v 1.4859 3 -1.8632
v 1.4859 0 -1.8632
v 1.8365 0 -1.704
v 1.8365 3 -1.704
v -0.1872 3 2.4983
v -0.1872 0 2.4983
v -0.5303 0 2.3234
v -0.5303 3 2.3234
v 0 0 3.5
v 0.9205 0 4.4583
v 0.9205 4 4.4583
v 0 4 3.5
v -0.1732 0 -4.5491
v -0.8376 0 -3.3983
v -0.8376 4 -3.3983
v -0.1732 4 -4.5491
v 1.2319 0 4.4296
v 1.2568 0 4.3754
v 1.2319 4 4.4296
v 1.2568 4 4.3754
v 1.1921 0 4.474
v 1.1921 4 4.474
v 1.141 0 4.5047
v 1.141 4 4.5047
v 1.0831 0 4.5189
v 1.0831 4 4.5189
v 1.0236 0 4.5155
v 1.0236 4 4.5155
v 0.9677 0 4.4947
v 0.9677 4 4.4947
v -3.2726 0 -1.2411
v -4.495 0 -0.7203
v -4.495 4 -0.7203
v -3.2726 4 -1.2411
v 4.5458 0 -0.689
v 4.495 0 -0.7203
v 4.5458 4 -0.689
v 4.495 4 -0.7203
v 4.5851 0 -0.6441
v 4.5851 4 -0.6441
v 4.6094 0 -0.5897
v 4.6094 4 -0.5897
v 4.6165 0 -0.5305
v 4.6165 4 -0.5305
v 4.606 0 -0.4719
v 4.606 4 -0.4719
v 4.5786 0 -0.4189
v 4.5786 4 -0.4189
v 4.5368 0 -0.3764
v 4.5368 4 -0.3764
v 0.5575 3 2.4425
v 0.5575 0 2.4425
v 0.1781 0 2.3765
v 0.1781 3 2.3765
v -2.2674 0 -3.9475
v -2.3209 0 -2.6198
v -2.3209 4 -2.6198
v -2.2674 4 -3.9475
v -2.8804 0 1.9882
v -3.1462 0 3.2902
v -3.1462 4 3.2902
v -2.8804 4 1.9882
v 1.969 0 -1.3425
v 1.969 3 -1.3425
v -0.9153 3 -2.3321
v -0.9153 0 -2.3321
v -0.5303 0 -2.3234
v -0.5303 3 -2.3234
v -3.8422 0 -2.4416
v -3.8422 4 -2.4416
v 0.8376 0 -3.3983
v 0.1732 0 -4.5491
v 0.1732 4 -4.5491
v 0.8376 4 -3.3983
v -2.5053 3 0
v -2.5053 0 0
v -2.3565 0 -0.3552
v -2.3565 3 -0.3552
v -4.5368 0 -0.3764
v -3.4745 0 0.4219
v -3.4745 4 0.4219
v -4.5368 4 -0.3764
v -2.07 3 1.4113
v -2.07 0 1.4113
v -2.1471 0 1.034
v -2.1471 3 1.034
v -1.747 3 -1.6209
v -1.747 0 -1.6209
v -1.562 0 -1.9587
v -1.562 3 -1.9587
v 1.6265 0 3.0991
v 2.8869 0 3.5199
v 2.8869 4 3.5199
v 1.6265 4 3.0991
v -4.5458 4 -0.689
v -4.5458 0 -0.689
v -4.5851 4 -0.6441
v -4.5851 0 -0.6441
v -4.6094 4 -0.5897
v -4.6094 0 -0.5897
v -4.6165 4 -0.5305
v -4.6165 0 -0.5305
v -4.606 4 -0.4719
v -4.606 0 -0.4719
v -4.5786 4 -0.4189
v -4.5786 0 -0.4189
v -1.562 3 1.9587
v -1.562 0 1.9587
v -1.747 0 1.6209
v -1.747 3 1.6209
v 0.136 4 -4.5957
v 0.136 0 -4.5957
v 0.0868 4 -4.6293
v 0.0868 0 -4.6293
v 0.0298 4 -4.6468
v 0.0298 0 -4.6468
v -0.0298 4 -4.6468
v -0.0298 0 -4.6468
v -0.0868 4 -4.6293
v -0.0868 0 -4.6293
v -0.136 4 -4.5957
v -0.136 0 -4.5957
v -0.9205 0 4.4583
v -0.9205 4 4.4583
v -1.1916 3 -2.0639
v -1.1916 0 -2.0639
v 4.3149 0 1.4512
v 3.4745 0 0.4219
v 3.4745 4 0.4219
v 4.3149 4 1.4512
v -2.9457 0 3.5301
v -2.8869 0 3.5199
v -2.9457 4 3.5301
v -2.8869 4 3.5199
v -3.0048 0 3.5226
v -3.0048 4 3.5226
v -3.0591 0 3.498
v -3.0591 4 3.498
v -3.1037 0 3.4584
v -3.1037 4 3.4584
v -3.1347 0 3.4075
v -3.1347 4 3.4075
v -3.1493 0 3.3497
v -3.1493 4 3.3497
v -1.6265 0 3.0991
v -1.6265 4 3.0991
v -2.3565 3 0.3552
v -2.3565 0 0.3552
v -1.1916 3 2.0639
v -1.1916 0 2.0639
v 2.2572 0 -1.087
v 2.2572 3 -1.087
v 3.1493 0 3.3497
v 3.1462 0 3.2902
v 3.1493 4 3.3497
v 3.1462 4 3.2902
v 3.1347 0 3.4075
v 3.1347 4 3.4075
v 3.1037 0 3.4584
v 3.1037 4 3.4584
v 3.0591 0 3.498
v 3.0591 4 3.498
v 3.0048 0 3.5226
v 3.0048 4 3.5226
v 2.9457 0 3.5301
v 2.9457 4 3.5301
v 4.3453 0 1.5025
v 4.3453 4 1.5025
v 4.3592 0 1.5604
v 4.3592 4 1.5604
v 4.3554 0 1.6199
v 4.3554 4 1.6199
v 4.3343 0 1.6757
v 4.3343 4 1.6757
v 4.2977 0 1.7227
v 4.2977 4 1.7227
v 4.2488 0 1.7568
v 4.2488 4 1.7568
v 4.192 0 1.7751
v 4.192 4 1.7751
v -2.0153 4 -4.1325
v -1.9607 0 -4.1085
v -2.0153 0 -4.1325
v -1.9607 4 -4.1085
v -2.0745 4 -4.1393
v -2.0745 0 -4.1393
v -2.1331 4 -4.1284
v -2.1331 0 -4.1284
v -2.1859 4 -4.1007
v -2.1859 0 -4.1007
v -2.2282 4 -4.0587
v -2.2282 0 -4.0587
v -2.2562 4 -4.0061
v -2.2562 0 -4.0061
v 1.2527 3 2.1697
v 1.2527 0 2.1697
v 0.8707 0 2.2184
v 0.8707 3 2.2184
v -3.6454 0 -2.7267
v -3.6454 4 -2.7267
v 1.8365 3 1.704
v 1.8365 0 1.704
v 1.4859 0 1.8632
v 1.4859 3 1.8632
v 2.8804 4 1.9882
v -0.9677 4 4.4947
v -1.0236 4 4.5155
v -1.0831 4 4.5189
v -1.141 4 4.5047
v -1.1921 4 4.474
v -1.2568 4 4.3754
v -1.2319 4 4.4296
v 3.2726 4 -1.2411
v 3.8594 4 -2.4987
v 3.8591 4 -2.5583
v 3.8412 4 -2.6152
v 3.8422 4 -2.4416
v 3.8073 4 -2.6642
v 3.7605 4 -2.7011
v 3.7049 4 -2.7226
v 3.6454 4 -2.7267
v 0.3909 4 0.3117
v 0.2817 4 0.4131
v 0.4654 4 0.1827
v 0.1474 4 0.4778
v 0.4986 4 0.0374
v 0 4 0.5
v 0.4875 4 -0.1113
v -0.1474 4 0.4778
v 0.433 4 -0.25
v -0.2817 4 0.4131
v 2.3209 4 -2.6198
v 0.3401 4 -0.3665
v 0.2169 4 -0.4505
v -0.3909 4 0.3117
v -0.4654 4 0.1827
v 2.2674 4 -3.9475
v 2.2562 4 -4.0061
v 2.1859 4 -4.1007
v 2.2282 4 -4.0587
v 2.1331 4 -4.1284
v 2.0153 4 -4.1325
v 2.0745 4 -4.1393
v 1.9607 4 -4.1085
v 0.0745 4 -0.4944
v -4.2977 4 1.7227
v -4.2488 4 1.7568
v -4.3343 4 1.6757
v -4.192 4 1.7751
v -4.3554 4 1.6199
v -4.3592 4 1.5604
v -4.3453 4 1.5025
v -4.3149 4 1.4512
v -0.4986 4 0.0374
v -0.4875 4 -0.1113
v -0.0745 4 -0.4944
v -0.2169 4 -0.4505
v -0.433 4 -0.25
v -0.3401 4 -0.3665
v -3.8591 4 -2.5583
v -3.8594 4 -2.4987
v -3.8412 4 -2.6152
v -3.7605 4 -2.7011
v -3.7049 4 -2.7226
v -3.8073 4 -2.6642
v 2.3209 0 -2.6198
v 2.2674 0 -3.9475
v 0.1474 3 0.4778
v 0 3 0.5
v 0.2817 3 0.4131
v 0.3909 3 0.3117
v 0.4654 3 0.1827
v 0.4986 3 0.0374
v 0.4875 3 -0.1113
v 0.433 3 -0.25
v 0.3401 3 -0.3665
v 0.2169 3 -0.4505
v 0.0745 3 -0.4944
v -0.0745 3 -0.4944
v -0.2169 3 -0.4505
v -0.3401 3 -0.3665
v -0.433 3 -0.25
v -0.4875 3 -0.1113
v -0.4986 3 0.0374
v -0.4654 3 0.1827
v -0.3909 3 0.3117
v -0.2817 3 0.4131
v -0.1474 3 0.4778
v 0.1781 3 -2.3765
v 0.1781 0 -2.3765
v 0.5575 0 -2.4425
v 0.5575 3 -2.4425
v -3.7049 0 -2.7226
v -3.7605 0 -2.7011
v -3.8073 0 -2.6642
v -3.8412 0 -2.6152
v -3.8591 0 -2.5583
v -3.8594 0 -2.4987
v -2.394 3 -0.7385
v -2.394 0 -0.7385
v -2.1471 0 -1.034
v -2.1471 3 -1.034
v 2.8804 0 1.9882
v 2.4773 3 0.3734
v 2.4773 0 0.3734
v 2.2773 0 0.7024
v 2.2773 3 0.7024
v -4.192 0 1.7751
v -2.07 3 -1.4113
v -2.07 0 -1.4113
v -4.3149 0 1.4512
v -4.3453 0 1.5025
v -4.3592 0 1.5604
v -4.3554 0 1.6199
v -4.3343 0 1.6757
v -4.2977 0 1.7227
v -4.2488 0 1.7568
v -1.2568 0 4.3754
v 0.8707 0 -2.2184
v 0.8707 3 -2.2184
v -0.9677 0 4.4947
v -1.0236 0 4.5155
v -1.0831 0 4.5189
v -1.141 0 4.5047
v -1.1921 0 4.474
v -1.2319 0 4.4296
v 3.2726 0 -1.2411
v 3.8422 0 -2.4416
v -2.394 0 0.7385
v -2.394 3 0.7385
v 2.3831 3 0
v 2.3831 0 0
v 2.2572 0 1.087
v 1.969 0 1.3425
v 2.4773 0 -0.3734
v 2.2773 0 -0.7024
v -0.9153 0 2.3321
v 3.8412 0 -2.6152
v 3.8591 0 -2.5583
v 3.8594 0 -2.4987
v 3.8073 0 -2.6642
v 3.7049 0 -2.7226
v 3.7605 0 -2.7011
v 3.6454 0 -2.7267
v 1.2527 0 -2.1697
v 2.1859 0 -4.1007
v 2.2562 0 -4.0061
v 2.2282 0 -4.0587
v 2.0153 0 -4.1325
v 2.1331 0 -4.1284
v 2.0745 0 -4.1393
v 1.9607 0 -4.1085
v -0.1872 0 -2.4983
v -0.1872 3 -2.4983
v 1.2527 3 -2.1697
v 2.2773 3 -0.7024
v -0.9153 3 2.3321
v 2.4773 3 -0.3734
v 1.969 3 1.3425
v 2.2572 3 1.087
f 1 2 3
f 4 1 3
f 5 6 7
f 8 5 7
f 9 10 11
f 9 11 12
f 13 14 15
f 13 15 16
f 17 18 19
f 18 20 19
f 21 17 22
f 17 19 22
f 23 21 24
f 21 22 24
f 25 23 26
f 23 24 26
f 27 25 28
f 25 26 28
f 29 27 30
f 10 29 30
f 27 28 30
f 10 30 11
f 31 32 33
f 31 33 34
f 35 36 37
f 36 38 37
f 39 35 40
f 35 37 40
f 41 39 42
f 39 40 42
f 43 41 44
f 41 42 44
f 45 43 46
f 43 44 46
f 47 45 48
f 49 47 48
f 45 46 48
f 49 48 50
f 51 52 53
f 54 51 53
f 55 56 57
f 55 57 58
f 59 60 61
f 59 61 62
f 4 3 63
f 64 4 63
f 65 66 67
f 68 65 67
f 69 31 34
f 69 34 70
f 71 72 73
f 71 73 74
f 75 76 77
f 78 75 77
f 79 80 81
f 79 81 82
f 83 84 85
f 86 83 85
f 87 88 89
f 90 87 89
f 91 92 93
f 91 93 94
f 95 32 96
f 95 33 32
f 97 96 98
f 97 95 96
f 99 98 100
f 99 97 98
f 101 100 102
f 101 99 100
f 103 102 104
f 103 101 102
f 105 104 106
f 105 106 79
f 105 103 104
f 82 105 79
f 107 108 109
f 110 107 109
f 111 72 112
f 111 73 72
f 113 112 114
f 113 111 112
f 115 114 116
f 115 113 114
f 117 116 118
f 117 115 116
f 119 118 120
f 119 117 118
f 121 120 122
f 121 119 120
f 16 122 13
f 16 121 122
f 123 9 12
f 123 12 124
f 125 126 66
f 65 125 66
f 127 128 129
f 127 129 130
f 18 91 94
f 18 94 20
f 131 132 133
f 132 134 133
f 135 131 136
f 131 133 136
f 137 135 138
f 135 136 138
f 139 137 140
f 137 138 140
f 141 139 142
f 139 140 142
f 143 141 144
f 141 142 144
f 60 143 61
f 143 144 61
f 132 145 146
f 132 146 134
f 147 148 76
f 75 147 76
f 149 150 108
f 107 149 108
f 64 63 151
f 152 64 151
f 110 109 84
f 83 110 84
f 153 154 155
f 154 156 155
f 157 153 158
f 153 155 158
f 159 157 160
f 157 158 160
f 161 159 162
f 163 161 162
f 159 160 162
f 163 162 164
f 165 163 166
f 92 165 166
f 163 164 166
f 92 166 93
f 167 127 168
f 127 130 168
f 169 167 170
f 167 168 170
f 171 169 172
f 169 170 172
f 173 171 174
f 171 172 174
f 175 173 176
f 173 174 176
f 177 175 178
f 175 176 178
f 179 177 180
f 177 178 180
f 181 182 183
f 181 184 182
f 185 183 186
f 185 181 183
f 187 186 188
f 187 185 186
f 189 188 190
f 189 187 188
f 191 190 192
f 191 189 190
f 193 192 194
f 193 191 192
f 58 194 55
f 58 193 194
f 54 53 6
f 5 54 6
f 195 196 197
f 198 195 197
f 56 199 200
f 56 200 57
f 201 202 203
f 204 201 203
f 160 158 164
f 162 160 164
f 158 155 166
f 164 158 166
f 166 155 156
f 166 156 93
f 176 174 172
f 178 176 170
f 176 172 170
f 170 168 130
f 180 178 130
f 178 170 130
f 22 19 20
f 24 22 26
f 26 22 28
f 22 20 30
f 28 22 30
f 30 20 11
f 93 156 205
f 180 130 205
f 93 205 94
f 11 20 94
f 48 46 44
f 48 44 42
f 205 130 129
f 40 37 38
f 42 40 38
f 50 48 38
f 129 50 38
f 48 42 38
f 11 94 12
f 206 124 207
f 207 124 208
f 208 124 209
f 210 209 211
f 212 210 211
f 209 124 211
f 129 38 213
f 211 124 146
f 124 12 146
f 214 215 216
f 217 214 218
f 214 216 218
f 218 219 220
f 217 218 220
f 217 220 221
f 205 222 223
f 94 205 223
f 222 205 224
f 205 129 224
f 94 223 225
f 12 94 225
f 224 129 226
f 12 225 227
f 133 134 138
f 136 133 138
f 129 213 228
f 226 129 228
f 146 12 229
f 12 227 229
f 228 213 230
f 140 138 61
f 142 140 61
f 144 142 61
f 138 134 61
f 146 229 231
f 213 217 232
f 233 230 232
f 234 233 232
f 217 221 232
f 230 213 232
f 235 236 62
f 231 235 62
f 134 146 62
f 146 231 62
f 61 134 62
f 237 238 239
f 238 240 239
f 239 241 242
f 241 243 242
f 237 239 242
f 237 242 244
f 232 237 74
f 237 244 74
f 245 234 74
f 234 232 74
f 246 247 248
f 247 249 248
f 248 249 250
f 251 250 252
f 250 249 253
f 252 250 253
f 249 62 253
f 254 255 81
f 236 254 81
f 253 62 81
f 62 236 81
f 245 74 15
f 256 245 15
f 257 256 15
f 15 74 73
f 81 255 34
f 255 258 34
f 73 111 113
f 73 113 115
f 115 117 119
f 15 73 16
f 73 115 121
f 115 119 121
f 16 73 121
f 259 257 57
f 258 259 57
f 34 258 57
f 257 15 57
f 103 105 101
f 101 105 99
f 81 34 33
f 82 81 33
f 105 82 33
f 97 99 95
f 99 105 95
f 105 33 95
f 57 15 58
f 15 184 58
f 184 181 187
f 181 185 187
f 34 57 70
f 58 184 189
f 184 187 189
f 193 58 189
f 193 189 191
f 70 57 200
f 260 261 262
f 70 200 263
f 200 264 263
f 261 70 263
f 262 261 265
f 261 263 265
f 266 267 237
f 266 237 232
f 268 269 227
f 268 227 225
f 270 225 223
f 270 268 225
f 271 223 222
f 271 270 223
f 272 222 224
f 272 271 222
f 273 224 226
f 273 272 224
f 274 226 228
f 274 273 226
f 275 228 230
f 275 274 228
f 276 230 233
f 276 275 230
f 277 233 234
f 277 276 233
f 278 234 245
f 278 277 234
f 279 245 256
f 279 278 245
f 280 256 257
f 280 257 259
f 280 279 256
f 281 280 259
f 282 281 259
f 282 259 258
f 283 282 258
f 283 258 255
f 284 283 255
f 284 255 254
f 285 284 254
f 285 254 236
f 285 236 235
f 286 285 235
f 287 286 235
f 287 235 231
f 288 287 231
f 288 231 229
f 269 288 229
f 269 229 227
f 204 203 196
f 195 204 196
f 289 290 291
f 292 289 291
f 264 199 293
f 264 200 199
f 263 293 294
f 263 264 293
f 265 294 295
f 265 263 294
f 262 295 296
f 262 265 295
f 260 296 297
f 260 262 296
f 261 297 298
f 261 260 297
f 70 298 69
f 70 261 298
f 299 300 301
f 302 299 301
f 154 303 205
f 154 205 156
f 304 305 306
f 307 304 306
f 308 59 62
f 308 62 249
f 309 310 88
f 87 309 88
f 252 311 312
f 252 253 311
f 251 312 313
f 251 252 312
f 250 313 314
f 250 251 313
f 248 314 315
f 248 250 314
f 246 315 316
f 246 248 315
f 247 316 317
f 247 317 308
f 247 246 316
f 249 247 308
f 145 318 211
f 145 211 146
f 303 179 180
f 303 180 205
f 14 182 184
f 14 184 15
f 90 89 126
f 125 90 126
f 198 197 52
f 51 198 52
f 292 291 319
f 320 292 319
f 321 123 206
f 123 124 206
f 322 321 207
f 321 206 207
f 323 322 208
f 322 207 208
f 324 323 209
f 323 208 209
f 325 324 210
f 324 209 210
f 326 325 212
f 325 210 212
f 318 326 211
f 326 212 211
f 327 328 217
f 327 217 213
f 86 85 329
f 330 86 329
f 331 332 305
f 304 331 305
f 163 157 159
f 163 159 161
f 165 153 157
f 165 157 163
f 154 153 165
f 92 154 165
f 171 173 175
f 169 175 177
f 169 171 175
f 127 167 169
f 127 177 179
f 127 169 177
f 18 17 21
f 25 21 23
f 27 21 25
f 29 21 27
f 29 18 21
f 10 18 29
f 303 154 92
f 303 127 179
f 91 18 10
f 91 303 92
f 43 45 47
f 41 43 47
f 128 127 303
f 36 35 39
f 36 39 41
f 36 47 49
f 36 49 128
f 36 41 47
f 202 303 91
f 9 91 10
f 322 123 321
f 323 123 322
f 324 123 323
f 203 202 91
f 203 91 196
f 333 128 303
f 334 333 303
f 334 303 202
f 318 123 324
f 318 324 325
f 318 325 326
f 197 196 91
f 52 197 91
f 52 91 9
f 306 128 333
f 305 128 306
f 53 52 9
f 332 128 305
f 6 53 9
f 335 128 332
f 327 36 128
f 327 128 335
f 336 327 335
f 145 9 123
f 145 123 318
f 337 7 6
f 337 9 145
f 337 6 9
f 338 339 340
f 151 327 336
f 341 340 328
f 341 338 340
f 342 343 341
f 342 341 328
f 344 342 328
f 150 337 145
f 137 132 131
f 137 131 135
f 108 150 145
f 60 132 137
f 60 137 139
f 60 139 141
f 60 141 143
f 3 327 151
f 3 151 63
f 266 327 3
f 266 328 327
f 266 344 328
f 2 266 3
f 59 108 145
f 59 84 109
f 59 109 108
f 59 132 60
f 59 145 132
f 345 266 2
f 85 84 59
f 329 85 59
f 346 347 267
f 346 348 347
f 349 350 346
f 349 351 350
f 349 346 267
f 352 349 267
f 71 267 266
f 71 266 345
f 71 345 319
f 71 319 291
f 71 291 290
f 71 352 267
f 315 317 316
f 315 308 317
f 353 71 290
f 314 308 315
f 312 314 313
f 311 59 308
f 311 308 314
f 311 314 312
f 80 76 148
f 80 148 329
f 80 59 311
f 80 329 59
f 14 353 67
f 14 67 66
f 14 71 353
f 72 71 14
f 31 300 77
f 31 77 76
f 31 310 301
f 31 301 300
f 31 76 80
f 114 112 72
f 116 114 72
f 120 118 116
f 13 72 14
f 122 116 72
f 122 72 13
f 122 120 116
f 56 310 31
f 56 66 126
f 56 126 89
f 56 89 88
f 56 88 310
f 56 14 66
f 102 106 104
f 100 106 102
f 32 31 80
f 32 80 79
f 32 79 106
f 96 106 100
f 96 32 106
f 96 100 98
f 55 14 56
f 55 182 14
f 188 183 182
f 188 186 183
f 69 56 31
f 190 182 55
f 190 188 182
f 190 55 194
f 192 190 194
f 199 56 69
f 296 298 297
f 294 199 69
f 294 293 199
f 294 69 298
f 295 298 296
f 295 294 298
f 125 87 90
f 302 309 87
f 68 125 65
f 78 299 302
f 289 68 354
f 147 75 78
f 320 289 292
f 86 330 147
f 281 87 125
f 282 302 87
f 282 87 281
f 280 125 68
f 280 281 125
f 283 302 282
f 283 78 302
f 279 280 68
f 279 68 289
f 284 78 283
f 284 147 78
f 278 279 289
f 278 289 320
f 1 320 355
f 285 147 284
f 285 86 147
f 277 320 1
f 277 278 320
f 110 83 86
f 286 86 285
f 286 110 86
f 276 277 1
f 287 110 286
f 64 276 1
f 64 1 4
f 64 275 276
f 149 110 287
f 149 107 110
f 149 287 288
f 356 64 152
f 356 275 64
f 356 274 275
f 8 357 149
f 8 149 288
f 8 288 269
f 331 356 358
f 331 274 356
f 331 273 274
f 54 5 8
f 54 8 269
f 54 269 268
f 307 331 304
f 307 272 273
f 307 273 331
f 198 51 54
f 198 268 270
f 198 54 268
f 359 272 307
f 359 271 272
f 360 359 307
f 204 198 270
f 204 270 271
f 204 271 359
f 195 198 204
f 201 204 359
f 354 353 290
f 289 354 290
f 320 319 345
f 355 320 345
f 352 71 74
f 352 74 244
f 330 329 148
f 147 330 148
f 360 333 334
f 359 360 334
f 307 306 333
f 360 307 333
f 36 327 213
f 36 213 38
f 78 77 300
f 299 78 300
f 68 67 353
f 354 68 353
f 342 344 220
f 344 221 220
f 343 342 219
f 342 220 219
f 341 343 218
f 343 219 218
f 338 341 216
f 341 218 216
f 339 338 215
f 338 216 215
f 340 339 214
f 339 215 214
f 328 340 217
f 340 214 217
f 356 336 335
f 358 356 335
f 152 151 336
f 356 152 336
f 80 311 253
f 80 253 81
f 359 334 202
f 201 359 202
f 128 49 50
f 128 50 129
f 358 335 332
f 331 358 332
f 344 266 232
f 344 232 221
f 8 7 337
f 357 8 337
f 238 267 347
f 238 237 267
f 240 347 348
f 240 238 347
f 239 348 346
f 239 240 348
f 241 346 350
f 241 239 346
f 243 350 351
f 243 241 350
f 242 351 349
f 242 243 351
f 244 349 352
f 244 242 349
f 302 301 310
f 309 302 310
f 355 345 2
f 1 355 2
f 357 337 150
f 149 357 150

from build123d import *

# Parameters (mm, degrees)
SKETCH1_R           = 0.5
BOSS_EXTRUDE1_DEPTH = 4
CUT_EXTRUDE1_DEPTH  = 3
FILLET1_R           = 0.2


with BuildPart() as part:
    # Sketch1 → Boss-Extrude1 (new body)
    with BuildSketch(Plane(origin=(0, 0, 0), x_dir=(1, 0, 0), z_dir=(0, 1, 0))):
        Polygon((2.320929304, 2.619787619), (3.990706765, 2.754585991), (3.272556849, 1.241117105), (4.813715291, 0.584490857), (3.474481059, -0.421878381), (4.533959656, -1.719504088), (2.880443531, -1.988226614), (3.215528503, -3.629581369), (1.626531102, -3.09909609), (1.160458522, -4.708165299), (0, -3.5), (-1.160458522, -4.708165299), (-1.626531102, -3.09909609), (-3.215528503, -3.629581369), (-2.880443531, -1.988226614), (-4.533959656, -1.719504088), (-3.474481059, -0.421878381), (-4.813715291, 0.584490857), (-3.272556849, 1.241117105), (-3.990706765, 2.754585991), (-2.320929304, 2.619787619), (-2.253475412, 4.293638671), (-0.837604825, 3.398296361), (0, 4.849070475), (0.837604825, 3.398296361), (2.253475412, 4.293638671), align=None)
        with Locations(Location((0, 0, 0), (0, 0, 270))):
            Circle(SKETCH1_R, mode=Mode.SUBTRACT)
    extrude(amount=BOSS_EXTRUDE1_DEPTH)

    # Sketch2 → Cut-Extrude1 (cut)
    with BuildSketch(Plane.XZ):
        Polygon((-2.356515562, -0.355187571), (-2.394012407, -0.73845503), (-2.147128813, -1.03400274), (-2.069989712, -1.411295089), (-1.746960246, -1.620942227), (-1.562039347, -1.958735387), (-1.191566595, -2.063853884), (-0.915294931, -2.332133449), (-0.530297023, -2.323383066), (-0.187222544, -2.49831122), (0.178091766, -2.376469467), (0.557485388, -2.442503076), (0.870656321, -2.218396127), (1.252658297, -2.169667815), (1.485859241, -1.863208555), (1.836527019, -1.704048047), (1.969037046, -1.342466727), (2.257212255, -1.087016131), (2.27725727, -0.702440839), (2.477334277, -0.373398063), (2.383133191, 0), (2.477334277, 0.373398063), (2.27725727, 0.702440839), (2.257212255, 1.087016131), (1.969037046, 1.342466727), (1.836527019, 1.704048047), (1.485859241, 1.863208555), (1.252658297, 2.169667815), (0.870656321, 2.218396127), (0.557485388, 2.442503076), (0.178091766, 2.376469467), (-0.187222544, 2.49831122), (-0.530297023, 2.323383066), (-0.915294931, 2.332133449), (-1.191566595, 2.063853884), (-1.562039347, 1.958735387), (-1.746960246, 1.620942227), (-2.069989712, 1.411295089), (-2.147128813, 1.03400274), (-2.394012407, 0.73845503), (-2.356515562, 0.355187571), (-2.505316594, 0), align=None)
    extrude(amount=-CUT_EXTRUDE1_DEPTH, mode=Mode.SUBTRACT)

    # Fillet1
    fillet1_edges = [part.edges().sort_by_distance(p)[0] for p in [
        (4.813715291, 2, -0.584490857),
        (4.533959656, 2, 1.719504088),
        (3.215528503, 2, 3.629581369),
        (1.160458522, 2, 4.708165299),
        (-1.160458522, 2, 4.708165299),
        (-3.215528503, 2, 3.629581369),
        (-4.533959656, 2, 1.719504088),
        (-4.813715291, 2, -0.584490857),
        (-3.990706765, 2, -2.754585991),
        (-2.253475412, 2, -4.293638671),
        (0, 2, -4.849070475),
        (2.253475412, 2, -4.293638671),
        (3.990706765, 2, -2.754585991),
    ]]
    fillet(fillet1_edges, radius=FILLET1_R)


solid = part.part
